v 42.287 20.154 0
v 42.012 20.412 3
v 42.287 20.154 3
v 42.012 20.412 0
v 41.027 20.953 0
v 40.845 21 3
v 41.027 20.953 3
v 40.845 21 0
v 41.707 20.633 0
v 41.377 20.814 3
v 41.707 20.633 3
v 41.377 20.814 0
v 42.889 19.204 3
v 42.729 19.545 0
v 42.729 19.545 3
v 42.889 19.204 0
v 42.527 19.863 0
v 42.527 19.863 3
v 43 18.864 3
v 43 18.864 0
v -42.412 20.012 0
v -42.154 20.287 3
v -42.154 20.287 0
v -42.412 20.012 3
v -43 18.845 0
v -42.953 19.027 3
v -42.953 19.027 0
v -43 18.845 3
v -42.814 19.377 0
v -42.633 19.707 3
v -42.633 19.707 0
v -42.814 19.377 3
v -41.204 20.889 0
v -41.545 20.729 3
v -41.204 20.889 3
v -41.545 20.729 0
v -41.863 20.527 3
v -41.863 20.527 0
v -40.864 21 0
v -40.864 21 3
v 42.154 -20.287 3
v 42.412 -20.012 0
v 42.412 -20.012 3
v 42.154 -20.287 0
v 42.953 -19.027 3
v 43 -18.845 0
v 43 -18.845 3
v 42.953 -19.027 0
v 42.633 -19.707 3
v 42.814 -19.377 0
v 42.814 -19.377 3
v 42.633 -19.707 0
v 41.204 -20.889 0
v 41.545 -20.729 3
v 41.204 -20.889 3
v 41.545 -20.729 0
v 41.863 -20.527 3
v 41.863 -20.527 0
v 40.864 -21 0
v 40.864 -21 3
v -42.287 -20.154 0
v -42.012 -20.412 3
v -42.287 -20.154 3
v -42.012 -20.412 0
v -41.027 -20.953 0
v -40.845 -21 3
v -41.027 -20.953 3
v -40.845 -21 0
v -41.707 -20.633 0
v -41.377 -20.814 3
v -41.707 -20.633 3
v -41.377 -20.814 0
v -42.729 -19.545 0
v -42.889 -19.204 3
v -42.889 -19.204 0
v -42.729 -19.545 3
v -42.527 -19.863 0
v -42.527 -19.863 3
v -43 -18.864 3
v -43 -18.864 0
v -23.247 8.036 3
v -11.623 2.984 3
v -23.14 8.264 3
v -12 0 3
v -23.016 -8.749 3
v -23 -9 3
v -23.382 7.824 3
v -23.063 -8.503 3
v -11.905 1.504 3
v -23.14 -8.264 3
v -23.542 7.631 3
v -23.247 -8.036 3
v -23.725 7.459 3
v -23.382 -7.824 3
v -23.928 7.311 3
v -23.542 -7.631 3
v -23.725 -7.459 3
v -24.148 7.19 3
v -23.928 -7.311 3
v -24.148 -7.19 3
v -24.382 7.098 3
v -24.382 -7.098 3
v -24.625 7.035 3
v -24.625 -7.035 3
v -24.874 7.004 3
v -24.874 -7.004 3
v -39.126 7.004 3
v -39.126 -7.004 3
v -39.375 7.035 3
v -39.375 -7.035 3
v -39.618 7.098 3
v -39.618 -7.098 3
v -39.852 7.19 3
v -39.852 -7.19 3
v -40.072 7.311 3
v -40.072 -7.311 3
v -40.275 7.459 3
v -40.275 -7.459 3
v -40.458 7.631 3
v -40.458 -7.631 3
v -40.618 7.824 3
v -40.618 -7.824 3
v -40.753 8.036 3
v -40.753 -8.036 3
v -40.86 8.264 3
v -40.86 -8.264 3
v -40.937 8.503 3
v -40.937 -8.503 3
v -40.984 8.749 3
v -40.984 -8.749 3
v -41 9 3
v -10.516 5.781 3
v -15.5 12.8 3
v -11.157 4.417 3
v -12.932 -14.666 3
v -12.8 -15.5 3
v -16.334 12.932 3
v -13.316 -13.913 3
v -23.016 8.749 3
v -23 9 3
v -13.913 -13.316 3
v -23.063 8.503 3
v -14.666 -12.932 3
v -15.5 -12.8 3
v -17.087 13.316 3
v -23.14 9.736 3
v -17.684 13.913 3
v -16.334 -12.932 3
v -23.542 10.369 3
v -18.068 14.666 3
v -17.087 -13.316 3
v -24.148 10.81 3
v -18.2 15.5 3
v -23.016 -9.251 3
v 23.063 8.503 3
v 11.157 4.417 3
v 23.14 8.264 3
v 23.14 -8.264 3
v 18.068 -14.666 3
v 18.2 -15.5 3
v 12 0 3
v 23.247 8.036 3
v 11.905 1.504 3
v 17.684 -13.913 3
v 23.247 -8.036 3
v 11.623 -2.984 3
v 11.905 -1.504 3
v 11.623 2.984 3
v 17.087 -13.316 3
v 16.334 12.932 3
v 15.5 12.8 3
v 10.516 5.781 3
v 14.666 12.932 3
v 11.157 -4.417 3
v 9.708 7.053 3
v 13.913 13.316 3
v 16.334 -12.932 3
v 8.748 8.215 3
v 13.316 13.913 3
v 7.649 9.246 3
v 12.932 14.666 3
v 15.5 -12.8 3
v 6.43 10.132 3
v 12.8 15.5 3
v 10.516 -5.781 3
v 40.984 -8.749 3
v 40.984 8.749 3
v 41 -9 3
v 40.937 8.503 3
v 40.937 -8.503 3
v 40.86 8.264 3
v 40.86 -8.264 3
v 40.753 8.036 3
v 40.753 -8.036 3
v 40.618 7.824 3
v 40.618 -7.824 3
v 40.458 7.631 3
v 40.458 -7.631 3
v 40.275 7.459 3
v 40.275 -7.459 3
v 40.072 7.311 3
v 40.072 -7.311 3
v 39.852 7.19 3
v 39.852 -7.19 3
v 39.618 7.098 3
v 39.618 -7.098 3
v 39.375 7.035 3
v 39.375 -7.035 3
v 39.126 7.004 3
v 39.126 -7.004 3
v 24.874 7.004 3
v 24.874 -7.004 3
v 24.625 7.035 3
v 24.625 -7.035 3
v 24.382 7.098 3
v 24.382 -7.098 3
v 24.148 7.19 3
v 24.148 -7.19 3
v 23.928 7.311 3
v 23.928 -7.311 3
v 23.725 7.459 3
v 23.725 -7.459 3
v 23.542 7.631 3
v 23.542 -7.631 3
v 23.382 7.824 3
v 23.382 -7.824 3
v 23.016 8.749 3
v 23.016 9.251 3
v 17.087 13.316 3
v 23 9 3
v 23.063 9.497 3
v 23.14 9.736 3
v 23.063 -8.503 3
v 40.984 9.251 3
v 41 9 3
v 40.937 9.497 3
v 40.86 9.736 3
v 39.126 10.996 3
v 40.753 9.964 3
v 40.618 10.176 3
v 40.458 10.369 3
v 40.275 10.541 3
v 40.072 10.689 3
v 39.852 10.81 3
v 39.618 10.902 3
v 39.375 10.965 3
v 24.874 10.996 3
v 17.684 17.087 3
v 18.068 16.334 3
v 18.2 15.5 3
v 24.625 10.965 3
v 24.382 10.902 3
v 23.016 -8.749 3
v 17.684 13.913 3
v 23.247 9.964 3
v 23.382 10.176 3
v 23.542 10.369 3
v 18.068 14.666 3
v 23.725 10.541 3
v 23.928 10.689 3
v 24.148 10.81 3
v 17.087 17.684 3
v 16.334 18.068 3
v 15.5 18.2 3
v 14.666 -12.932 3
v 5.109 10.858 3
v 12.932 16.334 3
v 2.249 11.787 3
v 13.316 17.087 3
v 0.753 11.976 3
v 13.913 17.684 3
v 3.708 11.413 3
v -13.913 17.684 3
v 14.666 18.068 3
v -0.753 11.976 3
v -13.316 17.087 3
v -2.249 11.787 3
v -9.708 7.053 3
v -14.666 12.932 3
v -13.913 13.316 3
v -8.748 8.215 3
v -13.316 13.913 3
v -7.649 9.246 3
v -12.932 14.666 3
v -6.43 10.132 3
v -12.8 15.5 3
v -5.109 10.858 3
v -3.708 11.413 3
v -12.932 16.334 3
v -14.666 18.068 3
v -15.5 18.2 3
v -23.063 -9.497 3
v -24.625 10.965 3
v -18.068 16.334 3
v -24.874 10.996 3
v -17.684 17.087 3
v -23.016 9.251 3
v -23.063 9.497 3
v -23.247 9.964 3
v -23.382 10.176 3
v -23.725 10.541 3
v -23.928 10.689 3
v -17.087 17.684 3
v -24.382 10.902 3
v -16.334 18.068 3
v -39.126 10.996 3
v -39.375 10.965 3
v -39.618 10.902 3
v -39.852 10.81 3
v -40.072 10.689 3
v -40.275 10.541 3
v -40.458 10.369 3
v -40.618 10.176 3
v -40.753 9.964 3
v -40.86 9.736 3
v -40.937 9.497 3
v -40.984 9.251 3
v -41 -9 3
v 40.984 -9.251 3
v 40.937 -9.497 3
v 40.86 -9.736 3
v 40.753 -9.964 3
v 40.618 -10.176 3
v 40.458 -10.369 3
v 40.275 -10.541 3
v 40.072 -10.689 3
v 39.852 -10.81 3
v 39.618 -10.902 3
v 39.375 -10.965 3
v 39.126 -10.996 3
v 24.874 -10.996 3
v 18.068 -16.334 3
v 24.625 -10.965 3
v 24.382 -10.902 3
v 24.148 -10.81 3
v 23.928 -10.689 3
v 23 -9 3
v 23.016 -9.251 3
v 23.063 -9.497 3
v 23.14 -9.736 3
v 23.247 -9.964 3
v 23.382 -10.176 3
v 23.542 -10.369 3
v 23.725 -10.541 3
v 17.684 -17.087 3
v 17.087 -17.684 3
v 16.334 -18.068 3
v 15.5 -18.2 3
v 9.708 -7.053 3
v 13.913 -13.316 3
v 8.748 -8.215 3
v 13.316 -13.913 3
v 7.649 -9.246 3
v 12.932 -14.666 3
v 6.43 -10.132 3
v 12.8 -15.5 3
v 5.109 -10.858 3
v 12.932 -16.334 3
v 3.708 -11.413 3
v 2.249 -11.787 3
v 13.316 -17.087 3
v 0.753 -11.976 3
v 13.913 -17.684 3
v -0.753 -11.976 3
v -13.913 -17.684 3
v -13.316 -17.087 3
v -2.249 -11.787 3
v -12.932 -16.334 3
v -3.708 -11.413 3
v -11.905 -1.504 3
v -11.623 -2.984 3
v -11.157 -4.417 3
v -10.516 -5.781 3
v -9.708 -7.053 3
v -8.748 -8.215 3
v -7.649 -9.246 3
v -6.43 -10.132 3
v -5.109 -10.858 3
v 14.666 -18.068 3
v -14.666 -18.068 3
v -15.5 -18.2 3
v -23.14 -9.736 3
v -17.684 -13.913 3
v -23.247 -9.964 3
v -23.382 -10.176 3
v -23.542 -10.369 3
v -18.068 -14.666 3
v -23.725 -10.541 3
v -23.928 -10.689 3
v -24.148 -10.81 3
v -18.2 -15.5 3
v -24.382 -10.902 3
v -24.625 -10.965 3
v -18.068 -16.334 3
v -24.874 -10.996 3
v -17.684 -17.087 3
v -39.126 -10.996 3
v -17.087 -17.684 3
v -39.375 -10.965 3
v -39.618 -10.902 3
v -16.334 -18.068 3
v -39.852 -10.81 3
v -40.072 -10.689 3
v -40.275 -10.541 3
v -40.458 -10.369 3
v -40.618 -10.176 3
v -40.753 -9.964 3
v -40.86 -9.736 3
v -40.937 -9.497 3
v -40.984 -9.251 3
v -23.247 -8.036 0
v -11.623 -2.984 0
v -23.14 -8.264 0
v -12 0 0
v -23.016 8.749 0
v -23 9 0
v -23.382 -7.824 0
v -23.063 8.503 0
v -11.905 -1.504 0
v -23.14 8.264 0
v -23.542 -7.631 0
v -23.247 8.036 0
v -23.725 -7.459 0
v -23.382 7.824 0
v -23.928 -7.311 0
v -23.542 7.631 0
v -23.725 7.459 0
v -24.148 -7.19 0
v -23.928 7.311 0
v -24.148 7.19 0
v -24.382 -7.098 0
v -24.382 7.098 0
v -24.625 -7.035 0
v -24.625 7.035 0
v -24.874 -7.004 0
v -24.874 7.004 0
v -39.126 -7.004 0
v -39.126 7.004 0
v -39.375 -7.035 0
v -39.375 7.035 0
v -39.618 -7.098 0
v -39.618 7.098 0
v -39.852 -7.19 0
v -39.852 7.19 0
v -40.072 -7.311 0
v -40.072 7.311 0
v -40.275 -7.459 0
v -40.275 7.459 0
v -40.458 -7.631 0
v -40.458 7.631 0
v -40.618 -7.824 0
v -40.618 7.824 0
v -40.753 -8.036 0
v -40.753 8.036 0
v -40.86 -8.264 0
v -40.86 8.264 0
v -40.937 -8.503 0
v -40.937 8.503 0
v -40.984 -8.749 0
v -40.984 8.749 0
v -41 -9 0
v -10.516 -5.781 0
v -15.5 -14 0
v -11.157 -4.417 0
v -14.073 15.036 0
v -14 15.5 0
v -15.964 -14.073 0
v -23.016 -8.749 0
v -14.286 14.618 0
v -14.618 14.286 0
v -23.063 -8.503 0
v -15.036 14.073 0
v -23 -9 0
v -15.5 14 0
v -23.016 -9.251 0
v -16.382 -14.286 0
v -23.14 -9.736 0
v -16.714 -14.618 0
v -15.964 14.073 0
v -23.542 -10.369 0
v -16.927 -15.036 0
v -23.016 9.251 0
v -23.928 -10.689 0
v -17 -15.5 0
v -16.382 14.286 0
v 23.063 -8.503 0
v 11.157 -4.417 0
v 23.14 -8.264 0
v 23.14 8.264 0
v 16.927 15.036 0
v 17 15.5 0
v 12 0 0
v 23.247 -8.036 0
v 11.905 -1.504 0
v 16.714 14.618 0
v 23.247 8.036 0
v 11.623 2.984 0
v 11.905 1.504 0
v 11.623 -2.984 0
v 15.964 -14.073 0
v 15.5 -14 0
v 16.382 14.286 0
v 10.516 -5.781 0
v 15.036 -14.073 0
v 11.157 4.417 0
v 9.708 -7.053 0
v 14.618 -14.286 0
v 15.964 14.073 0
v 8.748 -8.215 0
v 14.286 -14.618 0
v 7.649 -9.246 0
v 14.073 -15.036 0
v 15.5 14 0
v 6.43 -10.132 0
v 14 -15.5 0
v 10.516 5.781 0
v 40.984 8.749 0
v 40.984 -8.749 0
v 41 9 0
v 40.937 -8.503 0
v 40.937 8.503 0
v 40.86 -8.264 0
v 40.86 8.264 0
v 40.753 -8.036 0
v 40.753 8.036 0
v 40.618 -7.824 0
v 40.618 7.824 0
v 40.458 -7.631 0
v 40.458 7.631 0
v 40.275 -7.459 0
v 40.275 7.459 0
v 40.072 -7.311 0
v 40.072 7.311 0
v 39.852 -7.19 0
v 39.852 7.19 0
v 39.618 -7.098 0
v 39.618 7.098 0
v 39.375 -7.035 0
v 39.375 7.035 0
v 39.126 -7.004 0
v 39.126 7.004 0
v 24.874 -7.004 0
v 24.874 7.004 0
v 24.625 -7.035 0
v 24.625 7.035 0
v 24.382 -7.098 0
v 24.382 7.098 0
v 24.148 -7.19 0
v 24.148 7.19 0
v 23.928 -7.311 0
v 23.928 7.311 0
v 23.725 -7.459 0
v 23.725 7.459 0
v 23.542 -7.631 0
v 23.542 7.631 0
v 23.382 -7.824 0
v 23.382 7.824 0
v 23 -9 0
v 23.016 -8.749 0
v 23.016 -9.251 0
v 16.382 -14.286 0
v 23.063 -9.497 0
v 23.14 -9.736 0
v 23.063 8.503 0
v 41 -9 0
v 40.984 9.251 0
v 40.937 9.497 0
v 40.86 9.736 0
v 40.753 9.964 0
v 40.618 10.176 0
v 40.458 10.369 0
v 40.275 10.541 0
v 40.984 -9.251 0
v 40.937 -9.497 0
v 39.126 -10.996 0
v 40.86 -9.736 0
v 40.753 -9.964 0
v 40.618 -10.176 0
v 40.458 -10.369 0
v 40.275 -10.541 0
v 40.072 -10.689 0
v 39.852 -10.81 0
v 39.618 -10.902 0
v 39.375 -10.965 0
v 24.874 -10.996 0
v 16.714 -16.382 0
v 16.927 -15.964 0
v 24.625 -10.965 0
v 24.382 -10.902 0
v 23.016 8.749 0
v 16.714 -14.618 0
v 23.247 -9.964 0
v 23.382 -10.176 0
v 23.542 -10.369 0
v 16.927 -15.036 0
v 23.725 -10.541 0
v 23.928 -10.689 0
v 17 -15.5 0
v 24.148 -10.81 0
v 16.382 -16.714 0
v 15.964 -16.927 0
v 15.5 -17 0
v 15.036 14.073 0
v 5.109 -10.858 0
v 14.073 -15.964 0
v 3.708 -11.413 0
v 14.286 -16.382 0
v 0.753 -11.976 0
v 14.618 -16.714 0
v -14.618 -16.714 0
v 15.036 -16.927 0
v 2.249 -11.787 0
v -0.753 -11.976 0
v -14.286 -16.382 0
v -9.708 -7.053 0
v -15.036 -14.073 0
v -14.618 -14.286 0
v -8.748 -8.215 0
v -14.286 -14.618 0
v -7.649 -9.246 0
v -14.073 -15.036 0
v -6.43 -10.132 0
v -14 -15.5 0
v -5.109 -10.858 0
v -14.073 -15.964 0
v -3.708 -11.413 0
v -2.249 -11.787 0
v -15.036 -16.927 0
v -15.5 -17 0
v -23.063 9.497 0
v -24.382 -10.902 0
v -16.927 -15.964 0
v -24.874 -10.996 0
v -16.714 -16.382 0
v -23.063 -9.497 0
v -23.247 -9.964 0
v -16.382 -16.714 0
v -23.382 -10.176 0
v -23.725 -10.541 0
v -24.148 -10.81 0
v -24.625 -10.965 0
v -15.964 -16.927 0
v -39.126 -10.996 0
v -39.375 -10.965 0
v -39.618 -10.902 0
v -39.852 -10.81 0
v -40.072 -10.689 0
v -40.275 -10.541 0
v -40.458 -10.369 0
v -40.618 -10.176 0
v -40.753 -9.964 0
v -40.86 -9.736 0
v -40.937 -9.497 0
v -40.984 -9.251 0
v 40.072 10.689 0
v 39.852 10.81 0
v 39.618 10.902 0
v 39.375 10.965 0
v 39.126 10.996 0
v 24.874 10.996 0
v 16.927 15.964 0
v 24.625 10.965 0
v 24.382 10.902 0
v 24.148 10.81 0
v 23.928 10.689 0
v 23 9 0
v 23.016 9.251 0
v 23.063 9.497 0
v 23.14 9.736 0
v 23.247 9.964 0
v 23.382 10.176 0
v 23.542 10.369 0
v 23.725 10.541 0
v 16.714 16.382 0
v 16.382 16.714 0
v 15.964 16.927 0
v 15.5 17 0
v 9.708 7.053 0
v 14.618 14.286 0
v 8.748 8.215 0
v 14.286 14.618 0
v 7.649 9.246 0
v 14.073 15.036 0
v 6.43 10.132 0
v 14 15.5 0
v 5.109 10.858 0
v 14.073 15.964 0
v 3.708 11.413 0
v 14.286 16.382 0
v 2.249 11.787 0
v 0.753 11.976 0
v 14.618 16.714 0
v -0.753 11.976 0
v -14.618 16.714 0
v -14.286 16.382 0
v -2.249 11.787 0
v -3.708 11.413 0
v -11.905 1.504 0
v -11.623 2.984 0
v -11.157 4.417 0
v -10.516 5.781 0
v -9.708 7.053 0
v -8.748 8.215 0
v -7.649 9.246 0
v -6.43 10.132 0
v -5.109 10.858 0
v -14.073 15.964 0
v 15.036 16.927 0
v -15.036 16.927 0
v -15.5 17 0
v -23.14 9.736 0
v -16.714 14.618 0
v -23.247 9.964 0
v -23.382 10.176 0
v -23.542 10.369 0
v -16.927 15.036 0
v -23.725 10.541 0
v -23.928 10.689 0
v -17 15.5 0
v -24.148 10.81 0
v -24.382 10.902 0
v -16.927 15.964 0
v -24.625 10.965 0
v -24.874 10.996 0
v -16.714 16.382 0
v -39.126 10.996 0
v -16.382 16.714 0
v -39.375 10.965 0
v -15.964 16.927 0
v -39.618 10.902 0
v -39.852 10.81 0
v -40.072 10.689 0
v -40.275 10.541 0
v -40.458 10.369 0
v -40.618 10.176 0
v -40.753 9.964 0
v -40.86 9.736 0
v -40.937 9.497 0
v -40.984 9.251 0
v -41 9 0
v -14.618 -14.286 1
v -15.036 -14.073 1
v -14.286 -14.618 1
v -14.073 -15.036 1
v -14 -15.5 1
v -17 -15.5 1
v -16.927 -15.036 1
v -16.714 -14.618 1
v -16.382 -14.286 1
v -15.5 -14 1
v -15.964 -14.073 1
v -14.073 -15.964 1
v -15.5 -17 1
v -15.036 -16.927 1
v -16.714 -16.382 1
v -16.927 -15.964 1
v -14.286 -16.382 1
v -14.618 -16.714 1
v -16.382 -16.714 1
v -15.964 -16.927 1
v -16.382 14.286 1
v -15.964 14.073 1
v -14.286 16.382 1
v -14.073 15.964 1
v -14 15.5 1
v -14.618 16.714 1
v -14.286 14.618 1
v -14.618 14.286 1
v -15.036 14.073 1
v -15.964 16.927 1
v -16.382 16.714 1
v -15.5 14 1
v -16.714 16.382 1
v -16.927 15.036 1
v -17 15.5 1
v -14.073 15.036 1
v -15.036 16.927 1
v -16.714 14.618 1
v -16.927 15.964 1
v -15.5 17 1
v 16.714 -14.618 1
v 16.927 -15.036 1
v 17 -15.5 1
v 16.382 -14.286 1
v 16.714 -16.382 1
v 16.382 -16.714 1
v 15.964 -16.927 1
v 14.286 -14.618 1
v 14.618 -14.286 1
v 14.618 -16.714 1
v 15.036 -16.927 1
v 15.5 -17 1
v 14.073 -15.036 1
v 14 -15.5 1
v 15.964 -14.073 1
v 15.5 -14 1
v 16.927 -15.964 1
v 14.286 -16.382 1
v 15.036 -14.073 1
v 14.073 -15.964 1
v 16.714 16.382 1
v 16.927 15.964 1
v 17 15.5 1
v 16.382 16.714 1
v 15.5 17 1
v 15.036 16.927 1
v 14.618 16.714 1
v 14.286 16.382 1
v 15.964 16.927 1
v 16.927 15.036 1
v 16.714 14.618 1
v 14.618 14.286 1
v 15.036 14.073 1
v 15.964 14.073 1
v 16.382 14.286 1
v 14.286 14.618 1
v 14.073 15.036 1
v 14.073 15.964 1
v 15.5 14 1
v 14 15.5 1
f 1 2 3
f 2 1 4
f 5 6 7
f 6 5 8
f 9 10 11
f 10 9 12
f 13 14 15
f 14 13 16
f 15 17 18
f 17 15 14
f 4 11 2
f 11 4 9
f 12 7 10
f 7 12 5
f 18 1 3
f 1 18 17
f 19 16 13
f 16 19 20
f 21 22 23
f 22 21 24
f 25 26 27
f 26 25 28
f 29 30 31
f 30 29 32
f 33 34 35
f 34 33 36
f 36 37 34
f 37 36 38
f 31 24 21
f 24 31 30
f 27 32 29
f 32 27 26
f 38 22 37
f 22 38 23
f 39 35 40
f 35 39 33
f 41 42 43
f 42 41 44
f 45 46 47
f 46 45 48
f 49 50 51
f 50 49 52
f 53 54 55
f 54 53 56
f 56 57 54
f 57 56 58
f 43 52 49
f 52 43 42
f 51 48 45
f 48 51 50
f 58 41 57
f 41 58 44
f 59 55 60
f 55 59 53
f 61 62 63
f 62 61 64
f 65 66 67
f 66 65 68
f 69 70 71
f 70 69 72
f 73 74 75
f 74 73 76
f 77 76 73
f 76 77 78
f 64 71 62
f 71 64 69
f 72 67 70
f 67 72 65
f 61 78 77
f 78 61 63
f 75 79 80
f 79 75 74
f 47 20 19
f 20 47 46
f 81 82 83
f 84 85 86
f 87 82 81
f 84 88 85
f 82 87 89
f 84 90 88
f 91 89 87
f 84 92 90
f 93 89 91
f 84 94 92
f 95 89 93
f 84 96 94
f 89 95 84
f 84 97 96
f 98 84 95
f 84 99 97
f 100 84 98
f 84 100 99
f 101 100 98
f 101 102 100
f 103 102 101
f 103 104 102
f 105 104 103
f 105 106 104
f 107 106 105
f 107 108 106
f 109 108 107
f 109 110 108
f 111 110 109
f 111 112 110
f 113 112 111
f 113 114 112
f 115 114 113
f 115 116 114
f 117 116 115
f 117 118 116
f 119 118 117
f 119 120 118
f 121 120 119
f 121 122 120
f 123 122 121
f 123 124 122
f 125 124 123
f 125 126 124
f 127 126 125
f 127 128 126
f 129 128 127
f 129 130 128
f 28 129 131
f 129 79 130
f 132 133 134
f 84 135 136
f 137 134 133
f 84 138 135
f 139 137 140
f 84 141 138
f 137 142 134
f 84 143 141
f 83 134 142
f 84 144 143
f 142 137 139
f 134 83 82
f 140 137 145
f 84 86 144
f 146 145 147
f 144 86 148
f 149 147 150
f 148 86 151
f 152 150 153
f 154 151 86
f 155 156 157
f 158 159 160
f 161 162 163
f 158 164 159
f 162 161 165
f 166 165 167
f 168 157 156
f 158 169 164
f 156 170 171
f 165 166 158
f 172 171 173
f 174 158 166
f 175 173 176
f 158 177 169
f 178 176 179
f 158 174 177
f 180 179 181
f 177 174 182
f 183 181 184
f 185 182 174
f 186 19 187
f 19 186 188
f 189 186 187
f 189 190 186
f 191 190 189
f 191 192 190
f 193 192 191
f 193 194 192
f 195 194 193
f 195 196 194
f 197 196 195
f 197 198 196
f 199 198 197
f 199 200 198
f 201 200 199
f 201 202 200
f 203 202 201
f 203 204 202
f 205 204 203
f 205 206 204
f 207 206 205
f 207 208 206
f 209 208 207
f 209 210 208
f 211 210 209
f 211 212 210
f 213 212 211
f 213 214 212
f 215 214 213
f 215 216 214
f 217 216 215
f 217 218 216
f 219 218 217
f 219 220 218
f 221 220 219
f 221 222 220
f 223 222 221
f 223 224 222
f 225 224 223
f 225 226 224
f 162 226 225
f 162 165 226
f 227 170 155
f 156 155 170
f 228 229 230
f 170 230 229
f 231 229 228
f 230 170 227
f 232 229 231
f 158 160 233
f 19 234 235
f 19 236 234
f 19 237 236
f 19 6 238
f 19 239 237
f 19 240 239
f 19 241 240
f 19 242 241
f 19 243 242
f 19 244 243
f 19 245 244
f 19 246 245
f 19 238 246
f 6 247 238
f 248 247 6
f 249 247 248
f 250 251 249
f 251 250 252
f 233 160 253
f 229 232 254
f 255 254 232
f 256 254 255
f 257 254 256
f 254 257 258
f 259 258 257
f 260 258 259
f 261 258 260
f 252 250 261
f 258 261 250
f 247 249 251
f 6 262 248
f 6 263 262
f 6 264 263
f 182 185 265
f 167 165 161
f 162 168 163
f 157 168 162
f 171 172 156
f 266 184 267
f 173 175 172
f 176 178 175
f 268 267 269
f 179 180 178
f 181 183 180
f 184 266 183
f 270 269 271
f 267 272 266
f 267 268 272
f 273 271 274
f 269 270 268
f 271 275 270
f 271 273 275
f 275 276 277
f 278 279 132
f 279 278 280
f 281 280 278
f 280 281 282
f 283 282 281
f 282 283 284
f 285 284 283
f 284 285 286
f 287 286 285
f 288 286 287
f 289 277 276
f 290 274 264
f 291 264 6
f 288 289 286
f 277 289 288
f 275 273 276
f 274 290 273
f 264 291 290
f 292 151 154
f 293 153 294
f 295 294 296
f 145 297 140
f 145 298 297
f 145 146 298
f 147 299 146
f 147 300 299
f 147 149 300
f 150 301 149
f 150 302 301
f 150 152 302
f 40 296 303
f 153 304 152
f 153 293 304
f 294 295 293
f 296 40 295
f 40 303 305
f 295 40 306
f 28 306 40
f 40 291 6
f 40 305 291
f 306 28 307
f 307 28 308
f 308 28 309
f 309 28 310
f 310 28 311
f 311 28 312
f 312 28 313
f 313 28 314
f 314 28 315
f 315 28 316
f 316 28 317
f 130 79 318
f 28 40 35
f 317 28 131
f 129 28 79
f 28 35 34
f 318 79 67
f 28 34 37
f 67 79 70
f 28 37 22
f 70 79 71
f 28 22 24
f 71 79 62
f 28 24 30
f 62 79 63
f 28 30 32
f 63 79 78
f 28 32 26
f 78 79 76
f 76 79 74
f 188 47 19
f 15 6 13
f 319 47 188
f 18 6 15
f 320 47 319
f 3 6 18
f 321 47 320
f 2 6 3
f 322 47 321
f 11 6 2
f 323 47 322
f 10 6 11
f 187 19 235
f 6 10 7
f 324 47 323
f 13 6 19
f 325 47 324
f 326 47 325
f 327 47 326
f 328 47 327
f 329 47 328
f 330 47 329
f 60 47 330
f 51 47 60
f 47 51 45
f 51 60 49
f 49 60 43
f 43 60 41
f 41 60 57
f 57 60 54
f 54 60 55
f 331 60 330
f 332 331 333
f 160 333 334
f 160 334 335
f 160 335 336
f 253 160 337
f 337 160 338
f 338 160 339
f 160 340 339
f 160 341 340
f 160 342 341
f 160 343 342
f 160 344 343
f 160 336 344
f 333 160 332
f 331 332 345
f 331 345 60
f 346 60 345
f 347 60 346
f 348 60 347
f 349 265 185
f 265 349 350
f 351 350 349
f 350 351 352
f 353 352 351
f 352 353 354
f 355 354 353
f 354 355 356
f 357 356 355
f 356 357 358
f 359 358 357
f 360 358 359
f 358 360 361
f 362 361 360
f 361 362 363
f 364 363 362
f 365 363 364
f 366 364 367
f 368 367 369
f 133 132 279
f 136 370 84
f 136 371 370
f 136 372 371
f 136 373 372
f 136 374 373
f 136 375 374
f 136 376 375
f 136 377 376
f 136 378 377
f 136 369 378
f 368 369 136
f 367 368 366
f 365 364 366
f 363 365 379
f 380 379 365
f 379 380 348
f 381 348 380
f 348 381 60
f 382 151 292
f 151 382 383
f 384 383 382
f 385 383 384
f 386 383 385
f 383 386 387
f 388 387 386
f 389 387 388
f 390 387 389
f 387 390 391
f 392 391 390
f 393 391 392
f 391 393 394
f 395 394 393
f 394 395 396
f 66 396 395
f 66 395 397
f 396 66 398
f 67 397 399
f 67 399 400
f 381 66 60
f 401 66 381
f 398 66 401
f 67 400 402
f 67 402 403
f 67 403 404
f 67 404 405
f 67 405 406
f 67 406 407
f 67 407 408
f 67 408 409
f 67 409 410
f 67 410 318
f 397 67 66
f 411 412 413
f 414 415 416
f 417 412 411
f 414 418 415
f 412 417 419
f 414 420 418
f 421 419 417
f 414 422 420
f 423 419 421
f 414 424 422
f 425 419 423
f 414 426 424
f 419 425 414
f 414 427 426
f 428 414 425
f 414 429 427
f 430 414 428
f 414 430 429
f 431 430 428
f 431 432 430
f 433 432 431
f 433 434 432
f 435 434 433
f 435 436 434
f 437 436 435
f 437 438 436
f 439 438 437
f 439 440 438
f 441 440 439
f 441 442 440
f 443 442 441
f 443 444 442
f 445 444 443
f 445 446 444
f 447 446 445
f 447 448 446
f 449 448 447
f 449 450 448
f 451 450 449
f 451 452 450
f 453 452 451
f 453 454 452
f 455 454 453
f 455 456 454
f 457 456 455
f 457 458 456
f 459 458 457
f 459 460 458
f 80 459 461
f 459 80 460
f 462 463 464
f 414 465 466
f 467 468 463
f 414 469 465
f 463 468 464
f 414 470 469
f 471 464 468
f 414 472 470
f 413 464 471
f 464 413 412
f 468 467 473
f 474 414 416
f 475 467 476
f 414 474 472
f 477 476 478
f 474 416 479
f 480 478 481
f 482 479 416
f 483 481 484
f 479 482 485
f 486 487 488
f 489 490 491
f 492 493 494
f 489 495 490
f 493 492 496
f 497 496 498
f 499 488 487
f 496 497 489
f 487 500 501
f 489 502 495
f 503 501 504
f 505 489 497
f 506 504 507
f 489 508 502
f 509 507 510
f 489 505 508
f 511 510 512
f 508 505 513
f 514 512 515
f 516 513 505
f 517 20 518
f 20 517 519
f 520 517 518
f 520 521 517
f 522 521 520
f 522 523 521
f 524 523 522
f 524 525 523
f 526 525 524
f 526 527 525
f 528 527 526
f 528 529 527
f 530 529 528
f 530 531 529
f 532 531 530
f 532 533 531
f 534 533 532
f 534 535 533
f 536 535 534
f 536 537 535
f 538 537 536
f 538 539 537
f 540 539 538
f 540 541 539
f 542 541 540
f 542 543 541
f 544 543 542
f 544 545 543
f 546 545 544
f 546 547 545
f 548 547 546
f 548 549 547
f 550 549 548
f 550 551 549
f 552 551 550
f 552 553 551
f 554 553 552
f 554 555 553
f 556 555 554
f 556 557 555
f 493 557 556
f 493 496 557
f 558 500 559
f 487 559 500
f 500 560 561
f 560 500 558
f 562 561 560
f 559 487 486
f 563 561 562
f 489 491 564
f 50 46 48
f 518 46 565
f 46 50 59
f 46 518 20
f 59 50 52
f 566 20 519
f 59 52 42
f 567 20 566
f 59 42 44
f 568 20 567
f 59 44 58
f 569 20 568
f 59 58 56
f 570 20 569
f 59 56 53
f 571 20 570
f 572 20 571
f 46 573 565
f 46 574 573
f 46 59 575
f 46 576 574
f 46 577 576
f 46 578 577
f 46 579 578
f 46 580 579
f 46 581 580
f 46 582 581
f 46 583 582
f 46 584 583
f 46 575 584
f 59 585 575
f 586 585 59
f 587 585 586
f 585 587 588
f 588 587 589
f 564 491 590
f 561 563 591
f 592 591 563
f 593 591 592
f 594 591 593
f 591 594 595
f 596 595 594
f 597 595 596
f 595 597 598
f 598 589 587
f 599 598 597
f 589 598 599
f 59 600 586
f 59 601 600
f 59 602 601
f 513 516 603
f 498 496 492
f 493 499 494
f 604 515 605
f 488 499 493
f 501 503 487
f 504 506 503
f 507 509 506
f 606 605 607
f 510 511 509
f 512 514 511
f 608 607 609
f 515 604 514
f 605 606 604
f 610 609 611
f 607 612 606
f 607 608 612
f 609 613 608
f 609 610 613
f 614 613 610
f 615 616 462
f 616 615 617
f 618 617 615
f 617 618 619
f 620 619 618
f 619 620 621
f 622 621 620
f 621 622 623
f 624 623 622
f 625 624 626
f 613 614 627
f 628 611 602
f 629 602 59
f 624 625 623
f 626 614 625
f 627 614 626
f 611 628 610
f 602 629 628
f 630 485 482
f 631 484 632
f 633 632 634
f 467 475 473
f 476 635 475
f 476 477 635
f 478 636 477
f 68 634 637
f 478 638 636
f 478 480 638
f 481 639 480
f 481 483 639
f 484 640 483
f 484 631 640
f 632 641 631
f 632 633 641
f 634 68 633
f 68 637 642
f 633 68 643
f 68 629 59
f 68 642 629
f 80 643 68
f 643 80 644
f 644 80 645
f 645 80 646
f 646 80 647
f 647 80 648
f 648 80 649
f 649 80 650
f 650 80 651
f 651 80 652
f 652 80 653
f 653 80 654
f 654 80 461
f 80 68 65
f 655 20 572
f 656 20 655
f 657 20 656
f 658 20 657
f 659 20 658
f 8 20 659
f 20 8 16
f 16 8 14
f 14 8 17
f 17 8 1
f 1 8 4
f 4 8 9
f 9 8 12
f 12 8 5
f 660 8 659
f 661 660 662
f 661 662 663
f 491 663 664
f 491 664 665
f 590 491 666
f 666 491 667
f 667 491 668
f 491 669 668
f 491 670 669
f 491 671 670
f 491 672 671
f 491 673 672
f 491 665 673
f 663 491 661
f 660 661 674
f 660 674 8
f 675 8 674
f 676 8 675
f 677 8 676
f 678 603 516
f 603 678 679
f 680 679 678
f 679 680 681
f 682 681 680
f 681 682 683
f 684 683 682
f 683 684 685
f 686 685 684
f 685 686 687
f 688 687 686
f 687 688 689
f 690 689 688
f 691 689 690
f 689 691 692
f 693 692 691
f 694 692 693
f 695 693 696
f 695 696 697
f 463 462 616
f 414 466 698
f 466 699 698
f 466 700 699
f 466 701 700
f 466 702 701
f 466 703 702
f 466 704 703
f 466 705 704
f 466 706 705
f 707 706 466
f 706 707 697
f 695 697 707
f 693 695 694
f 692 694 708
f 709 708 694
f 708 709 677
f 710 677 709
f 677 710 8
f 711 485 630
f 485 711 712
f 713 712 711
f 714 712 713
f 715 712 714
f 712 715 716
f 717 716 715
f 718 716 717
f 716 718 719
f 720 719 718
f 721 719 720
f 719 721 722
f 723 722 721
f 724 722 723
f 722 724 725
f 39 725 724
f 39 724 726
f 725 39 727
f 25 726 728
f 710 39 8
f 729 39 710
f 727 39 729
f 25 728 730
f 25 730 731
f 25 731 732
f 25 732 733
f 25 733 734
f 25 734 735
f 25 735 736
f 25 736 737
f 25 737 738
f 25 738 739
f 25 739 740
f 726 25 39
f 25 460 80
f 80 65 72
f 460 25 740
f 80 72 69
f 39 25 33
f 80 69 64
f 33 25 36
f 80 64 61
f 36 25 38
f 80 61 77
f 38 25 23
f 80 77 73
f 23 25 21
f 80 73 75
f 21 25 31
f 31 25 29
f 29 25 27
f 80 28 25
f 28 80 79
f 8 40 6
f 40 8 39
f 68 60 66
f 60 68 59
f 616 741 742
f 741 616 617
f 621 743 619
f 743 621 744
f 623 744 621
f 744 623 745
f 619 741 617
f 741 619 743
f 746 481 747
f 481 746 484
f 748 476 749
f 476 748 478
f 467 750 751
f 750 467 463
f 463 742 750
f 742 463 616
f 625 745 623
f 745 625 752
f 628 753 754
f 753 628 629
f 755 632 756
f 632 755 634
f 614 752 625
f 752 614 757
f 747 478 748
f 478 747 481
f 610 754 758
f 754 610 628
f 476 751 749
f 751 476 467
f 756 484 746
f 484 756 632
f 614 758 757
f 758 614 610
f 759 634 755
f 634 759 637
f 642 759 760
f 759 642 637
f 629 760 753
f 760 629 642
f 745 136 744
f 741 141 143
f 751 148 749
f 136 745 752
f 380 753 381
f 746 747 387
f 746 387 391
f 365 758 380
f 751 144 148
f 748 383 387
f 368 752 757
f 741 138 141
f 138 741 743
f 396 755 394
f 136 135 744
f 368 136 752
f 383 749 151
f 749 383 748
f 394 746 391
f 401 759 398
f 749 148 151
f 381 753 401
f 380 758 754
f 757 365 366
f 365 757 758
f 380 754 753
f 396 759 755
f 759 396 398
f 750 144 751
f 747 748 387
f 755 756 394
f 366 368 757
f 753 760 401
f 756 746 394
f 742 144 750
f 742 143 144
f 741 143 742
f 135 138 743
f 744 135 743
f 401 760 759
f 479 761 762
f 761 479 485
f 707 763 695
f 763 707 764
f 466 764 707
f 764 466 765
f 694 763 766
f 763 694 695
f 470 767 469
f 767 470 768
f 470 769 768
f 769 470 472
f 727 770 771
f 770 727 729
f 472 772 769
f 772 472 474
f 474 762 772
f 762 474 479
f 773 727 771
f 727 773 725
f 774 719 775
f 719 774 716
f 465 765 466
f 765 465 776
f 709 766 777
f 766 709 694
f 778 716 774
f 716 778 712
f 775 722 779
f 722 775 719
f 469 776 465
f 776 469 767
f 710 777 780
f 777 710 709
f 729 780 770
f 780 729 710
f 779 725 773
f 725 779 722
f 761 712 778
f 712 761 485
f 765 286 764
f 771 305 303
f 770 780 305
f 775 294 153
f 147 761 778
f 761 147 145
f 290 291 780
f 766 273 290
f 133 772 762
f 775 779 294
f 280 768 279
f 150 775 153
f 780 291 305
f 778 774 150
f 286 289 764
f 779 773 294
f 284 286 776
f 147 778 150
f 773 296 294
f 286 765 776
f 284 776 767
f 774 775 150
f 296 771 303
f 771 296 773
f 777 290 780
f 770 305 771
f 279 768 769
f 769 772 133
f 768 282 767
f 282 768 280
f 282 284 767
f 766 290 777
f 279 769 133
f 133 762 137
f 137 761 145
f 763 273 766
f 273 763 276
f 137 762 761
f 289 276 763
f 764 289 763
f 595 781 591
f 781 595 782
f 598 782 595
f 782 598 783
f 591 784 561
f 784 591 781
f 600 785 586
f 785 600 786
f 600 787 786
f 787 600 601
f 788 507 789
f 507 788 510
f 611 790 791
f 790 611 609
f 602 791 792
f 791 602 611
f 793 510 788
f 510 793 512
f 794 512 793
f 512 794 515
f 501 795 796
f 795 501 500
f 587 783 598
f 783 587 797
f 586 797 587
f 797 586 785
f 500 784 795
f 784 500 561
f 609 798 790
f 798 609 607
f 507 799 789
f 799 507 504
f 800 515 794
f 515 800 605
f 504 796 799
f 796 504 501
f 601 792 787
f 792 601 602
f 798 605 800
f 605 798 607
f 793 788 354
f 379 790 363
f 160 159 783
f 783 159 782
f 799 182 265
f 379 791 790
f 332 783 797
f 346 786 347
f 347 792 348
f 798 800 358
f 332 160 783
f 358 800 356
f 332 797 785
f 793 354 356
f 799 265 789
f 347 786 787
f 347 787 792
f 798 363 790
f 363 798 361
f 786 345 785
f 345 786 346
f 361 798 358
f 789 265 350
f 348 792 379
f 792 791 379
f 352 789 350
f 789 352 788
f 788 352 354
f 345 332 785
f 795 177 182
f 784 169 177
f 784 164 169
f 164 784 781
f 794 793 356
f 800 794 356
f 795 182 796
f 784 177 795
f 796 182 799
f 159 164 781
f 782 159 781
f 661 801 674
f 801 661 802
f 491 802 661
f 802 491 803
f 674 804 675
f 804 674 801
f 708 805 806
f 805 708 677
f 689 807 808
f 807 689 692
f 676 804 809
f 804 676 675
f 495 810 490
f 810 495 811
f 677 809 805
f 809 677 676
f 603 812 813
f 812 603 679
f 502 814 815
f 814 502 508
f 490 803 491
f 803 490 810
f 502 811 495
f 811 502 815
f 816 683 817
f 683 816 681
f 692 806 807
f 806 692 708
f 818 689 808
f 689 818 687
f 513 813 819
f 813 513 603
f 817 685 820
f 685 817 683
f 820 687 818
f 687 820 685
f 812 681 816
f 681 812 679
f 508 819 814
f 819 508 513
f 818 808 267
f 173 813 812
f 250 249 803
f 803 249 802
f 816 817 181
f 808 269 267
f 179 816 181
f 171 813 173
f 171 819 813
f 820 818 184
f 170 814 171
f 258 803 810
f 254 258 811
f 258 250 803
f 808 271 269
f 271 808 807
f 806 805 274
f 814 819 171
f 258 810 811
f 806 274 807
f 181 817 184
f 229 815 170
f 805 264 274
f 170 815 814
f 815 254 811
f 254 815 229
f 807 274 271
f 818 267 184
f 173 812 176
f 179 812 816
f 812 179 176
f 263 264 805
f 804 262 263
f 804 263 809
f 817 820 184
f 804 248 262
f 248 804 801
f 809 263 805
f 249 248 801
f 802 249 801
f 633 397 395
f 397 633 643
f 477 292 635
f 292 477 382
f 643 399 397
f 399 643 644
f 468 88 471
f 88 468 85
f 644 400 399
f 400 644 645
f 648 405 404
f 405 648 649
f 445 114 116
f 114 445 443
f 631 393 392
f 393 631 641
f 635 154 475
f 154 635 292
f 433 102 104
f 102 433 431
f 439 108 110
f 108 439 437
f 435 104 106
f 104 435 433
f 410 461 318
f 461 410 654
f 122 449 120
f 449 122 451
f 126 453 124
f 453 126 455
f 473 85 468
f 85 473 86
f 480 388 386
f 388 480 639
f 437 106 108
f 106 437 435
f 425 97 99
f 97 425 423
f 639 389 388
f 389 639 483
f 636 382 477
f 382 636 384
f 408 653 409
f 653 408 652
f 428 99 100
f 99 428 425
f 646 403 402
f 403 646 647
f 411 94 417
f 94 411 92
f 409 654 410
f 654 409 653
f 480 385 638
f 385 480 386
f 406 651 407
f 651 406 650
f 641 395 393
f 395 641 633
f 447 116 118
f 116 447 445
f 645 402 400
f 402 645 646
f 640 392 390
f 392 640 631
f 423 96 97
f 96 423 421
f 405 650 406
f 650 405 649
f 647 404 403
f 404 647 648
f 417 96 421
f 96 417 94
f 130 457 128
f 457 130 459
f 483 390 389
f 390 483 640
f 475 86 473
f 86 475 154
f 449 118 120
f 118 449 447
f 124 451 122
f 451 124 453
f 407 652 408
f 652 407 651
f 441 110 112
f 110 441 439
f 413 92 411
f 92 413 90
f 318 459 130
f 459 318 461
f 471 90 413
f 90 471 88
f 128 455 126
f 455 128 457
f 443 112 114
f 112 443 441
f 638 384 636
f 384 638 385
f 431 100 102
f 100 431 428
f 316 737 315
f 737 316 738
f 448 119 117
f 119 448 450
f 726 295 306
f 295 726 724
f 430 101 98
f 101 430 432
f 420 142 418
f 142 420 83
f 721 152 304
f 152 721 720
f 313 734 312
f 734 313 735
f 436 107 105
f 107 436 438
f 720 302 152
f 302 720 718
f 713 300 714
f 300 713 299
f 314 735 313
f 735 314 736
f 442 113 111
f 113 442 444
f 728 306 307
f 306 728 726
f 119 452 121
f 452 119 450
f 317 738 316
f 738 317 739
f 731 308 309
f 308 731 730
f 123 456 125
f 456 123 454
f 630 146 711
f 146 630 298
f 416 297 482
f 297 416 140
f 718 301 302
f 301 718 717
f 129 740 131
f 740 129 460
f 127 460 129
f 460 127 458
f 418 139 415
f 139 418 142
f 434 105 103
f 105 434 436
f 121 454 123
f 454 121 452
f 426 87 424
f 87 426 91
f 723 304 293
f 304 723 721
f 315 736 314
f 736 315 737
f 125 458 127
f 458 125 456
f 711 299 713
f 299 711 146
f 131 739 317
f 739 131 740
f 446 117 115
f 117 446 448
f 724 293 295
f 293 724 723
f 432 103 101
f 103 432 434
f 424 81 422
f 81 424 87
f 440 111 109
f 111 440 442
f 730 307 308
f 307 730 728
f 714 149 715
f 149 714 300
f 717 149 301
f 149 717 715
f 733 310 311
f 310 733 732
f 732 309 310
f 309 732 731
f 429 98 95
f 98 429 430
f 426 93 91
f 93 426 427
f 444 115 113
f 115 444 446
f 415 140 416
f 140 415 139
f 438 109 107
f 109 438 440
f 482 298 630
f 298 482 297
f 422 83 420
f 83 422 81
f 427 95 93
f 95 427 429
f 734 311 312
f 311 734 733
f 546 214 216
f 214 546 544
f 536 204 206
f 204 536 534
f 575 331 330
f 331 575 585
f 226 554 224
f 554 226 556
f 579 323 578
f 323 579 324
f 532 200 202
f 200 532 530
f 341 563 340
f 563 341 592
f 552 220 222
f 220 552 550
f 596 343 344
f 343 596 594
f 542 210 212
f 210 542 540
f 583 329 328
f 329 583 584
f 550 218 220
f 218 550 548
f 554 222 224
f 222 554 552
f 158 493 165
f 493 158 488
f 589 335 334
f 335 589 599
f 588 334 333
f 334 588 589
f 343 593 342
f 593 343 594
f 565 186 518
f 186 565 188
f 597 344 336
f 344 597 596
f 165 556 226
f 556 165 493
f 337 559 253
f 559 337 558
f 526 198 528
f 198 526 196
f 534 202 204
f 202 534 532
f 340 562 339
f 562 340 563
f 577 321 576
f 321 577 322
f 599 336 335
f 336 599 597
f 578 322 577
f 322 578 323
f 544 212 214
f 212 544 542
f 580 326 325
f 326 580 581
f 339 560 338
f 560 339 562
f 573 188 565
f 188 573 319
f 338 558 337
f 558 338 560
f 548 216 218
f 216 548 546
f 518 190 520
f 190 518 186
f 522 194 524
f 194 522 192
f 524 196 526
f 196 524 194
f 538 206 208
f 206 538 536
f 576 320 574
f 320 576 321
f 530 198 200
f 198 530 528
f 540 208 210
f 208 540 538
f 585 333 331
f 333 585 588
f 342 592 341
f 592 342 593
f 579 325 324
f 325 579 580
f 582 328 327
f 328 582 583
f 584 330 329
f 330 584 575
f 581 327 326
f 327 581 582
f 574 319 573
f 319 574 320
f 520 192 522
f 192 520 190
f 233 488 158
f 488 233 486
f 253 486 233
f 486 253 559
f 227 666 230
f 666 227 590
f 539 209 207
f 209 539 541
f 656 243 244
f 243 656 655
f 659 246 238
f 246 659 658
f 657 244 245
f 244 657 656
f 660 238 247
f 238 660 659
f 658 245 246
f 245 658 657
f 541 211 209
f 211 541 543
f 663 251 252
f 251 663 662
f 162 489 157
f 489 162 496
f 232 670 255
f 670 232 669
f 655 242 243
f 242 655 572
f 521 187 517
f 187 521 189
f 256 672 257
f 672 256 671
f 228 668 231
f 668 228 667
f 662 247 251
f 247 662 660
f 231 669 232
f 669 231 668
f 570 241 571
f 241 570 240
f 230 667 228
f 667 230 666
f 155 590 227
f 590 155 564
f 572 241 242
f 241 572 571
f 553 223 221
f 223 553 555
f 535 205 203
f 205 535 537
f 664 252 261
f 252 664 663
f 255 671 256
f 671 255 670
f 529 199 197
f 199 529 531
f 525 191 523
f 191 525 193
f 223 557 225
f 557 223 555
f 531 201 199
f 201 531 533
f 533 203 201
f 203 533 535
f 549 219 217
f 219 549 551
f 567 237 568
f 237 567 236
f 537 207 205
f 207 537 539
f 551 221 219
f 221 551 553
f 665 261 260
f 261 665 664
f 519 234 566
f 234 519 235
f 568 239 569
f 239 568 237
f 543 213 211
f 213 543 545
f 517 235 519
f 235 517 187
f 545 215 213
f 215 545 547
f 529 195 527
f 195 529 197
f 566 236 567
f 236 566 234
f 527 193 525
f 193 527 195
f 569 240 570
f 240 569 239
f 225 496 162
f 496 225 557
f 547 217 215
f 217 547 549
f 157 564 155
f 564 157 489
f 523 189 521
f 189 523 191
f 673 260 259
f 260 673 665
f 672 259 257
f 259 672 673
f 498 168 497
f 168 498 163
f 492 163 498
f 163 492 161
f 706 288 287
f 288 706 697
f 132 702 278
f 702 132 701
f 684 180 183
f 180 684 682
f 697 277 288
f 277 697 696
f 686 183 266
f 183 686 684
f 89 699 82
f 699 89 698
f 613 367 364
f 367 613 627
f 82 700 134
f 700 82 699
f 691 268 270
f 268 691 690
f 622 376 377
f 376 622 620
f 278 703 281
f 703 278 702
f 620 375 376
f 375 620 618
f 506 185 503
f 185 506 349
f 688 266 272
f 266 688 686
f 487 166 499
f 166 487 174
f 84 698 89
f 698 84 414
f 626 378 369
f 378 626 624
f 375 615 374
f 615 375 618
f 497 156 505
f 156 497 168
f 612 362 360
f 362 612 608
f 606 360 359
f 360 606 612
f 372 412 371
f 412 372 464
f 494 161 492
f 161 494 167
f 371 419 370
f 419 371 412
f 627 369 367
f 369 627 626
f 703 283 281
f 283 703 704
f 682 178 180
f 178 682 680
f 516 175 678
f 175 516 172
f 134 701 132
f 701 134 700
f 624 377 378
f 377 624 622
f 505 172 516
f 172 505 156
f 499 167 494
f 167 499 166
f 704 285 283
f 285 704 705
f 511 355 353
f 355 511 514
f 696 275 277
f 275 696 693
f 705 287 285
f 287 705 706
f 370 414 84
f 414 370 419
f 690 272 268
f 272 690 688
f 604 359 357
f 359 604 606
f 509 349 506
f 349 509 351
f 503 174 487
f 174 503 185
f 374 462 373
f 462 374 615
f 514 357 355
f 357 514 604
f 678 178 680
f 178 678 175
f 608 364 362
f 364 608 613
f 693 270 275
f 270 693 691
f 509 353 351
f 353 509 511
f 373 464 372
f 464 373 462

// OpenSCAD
// file: utils.scad
// Author: Mihai Oltean, www.tcreate.org, mihai.oltean@gmail.com
// More details: jenny5.org
// Source: github.com/jenny5-robot
// MIT License
//--------------------------------------------------------------

module colt(radius, height)
{
	difference(){
		cube ([radius, radius, height]);
		cylinder	(h = height, r = radius, $fn = 30);
	}
}
/////////////////////////////////////////////////////////////////////////////////////////////////////////////////////////
module colt_sferic(radius)
{
	difference(){
		cube ([radius, radius, radius]);
		sphere(r = radius, $fn = 40);
	}
}
/////////////////////////////////////////////////////////////////////////////////////////////////////////////////////////
module coloana_sferica(height, radius)
{
		difference(){
			cube ([height, height, height]);
			cylinder(h= height, r = radius, $fn = 50);
		}
}
/////////////////////////////////////////////////////////////////////////////////////////////////////////////////////////
// file: config.scad
// Author: Mihai Oltean, www.tcreate.org, mihai.oltean@gmail.com
// More details: jenny5.org
// Source: github.com/jenny5-robot
// MIT License
//--------------------------------------------------------------

aluminium_color = "Silver";
screw_color = "LightSlateGray";
frame_color = aluminium_color;
shaft_color = "Silver";
plastic_color = "LimeGreen";
pulley_color = "DarkSlateGray";
// file: params_basic_components.scad
// Author: Mihai Oltean, www.tcreate.org, mihai.oltean@gmail.com
// More details: jenny5.org
// Source: github.com/jenny5-robot
// MIT License
//--------------------------------------------------------------

spring_length = 20;

smooth_rod_8_radius = 4;
smooth_rod_10_radius = 5;
smooth_rod_12_radius = 6;

tolerance = 0.1;
display_tolerance = 1;

overlap_tolerance = 0.01;


wall_thick_1 = 1;
wall_thick_2 = 2;
wall_thick_3 = 3;
wall_thick_4 = 4;
wall_thick_5 = 5;
wall_thick_5_5 = 5.5;
wall_thick_6 = 6;
wall_thick_7 = 7;
wall_thick_8 = 8;
wall_thick_9 = 9;
wall_thick_10 = 10;
wall_thick_12 = 10;

wrench_radius = 11;

ghidaj_radius = 4;
ghidaj_radius_12 = 6;

canal_diameter = 8.22;
canal_height = 2.2;

filament_radius = 0.9;

bowden_tube_radius = 2.5;

m3_tolerance = 0.1;

latura_mare_L = 40;
latura_mica_L = 15;
grosime_perete_L = 3;

latura_L_50x50 = 50;
latura_L_40x40 = 40;

latura_U_50x50 = 50;
latura_U_40x40 = 40;


tolerance_z = [0, 0, tolerance];
tolerance_x = [tolerance, 0, 0];
tolerance_y = [0, tolerance, 0];

display_tolerance_z = [0, 0, display_tolerance];
display_tolerance_x = [display_tolerance, 0, 0];
display_tolerance_y = [0, display_tolerance, 0];
// file: params_stepper_motors.scad
// Author: Mihai Oltean, www.tcreate.org, mihai.oltean@gmail.com
// More details: jenny5.org
// Source: github.com/jenny5-robot
// MIT License
//--------------------------------------------------------------

nema_17_width = 42.3;
nema_17_motor_height_sparkfun = 36;
nema_17_motor_hole_radius_sparkfun  = 14;
nema_17_motor_hole_radius_camiel  = 12;
nema_17_dist_between_screw_holes = 31;
nema_17_height = 47;
nema_17_shaft_length = 24;

nema_14_width = 39.3;
nema_14_motor_hole_radius  = 11;
nema_14_dist_between_screw_holes = 31;
nema_14_height = 47;
nema_14_shaft_length = 20;

nema_11_width = 28;
nema_11_motor_hole_radius = 11;
nema_11_motor_gearbox_radius = 14;
nema_11_motor_gearbox_hole_radius = 9;
nema_11_gearbox_dist_between_screw_holes = 22 / sqrt(2);
nema_11_dist_between_screw_holes = 23;
nema_11_height = 32;
nema_11_with_gearbox_height = 53;
nema_11_gearbox_length = 25;
nema_11_shaft_length = 18;

nema_17_motor_gearbox_radius = 18;
nema_17_gearbox_dist_between_screw_holes = 20;
nema_17_with_gearbox_height = 82.8;
nema_17_gearbox_length = 30;
nema_17_gearbox_base_height = 5;
nema_17_gearbox_shaft_length = 18;
nema_17_gearbox_shaft_radius = 4;
nema_17_gearbox_motor_hole_radius  = 11;



nema_11_sizes = [nema_11_width, nema_11_width, nema_11_height];

gauri_nema_17 = [
[0, 0, 0], 
[-nema_17_dist_between_screw_holes / 2, -nema_17_dist_between_screw_holes / 2, 0], 
[-nema_17_dist_between_screw_holes / 2, nema_17_dist_between_screw_holes / 2, 0], 
[nema_17_dist_between_screw_holes / 2, -nema_17_dist_between_screw_holes / 2, 0], 
[nema_17_dist_between_screw_holes / 2, nema_17_dist_between_screw_holes / 2, 0]
];

gauri_nema_11 = [
[0, 0, 0], 
[-nema_11_dist_between_screw_holes / 2, -nema_11_dist_between_screw_holes / 2, 0], 
[-nema_11_dist_between_screw_holes / 2, nema_11_dist_between_screw_holes / 2, 0], 
[nema_11_dist_between_screw_holes / 2, -nema_11_dist_between_screw_holes / 2, 0], 
[nema_11_dist_between_screw_holes / 2, nema_11_dist_between_screw_holes / 2, 0]
];

gearbox_nema_11_holes_position = [[0, 0, 0], 
[-nema_11_gearbox_dist_between_screw_holes / 2, -nema_11_gearbox_dist_between_screw_holes / 2, 0], [-nema_11_gearbox_dist_between_screw_holes / 2, nema_11_gearbox_dist_between_screw_holes / 2, 0], [nema_11_gearbox_dist_between_screw_holes / 2, -nema_11_gearbox_dist_between_screw_holes / 2, 0], [nema_11_gearbox_dist_between_screw_holes / 2, nema_11_gearbox_dist_between_screw_holes / 2, 0]];

gearbox_nema_17_holes_position = [
[0, 0, 0], 
[-nema_17_gearbox_dist_between_screw_holes / 2, -nema_17_gearbox_dist_between_screw_holes / 2, 0], 
[-nema_17_gearbox_dist_between_screw_holes / 2, nema_17_gearbox_dist_between_screw_holes / 2, 0], 
[nema_17_gearbox_dist_between_screw_holes / 2, -nema_17_gearbox_dist_between_screw_holes / 2, 0], 
[nema_17_gearbox_dist_between_screw_holes / 2, nema_17_gearbox_dist_between_screw_holes / 2, 0]
];
// file: params_screws_nuts_washers.scad
m2_screw_radius = 1;
m2_nut_radius = 2.2;
m2_nut_height = 1.6;
m2_nut_thick = m2_nut_height;

m3_screw_radius = 1.5;
m3_nut_radius = 3.1;
m3_nut_height = 2.3;
m3_nut_thick = m3_nut_height;
m3_autolock_nut_thick = m3_nut_thick + 1;

m4_screw_radius = 2;
m4_nut_radius = 4;
m4_auto_lock_nut_height = 5;
m4_nut_height = 3.25;
m4_nut_thick = 3.25;

m5_screw_radius = 2.5;
m5_nut_radius = 4.6;
m5_nut_height = 4;

m6_screw_radius = 3;
m6_nut_radius = 5.65;
m6_nut_thick = 5;
m6_nut_slim_thick = 3;
m6_autolock_nut_thick = 6;
m6_long_nut_thick = 9;

m8_screw_head_height = 5.7;
m8_screw_radius = 3.9;
m8_nut_small_width = 12.8;
m8_nut_radius = 7.35;
m8_slim_nut_small_width = 12.4;
m8_nut_thick = 6.5;
m8_nut_height = m8_nut_thick;
m8_slim_nut_height = 5.5;
m8_screw_head_radius = 6.5;
m8_autolock_nut_thick = 8;

m10_screw_radius = 5;
m10_nut_thick = 8;
m10_nut_radius = 9.8;

m12_screw_radius = 6;
m12_nut_thick = 8;
m12_nut_radius = 11;

m10_long_nut_radius = 9.71;
m10_long_nut_height = 29.8;

m10_long_thick_nut_radius = 7.41;
m10_long_thick_nut_height = 30.4;

m12_plastic_nut_radius = 10.45;
m12_plastic_nut_height = 23.3;

tr12_3_nut_radius = 11;
tr12_3_nut_height = 18.1;

washer_5 = 0.97;

washer_4_12_radius = 6;
washer_4_12_external_radius = 6;
washer_4_12_thick = 1;
washer_4_thick = 1;
washer_4_12_internal_radius = 2.15;

washer_4_9_external_radius = 4.5;
washer_4_9_internal_radius = 2.15;
washer_4_9_thick = 1;

washer_6_thick = 1.5;
washer_8_thick = 1.5;
washer_5_thick = 1;

washer_10_height = 2;
// file: params_placa_motor.scad
// Author: Mihai Oltean, www.tcreate.org, mihai.oltean@gmail.com
// More details: jenny5.org
// Source: github.com/jenny5-robot
// MIT License
//--------------------------------------------------------------

placa_motor_trunchi_size = ([86, 42, 3]);

function f_placa_motor_holes(length, width)  = [
[0, 0, 0], 
[-(length / 2 - 11), - (width / 2 - 12), 0],
[-(length / 2 - 11), (width / 2 - 12), 0],
[(length / 2 - 11), - (width / 2 - 12), 0],
[(length / 2 - 11), (width / 2 - 12), 0]
];

pozitie_gauri_placa_motor = f_placa_motor_holes(placa_motor_trunchi_size[0], placa_motor_trunchi_size[1]);
// main file
// Author: Mihai Oltean, www.tcreate.org, mihai.oltean@gmail.com
// More details: jenny5.org
// Source: github.com/jenny5-robot
// MIT License
//--------------------------------------------------------------

include <params_placa_motor.scad>
include <params_screws_nuts_washers.scad>
include <params_stepper_motors.scad>
include <params_basic_components.scad>
use <stepper_motors_utils.scad>
include <config.scad>

//----------------------------------------------------------------------------
module gauri_placa_motor(length, width, adancime, radius1 = 1.5, radius2 = 1.5, tolerance_x, tolerance_y)
{
	radius = m4_screw_radius;
    //dist_between_screw_holes_x = length - 2 * (8 + 0);
    //dist_between_screw_holes_y = width - 2 * (6 + 0);
   
    placa_motor_holes = f_placa_motor_holes(length, width);
        
    translate (placa_motor_holes[0] - display_tolerance_z) cylinder (h = adancime  + 2 * display_tolerance, r = nema_17_motor_hole_radius_camiel, $fn = 50);

    for (i = [1:4])
        hull(){
            translate (placa_motor_holes[i] - [tolerance_x, tolerance_y, 0] - display_tolerance_z) cylinder (h = adancime  + 2 * display_tolerance, r = radius, $fn = 50);
            translate (placa_motor_holes[i] + [tolerance_x, tolerance_y, 0] - display_tolerance_z) cylinder (h = adancime  + 2 * display_tolerance, r = radius, $fn = 50);
        }
}
//---------------------------------------------------------------------------
module placa_motor_trunchi(motor_housing_tolerance)
{
    difference(){
        color (plastic_color)
        translate ([-placa_motor_trunchi_size[0] / 2, -placa_motor_trunchi_size[1] / 2, 0]) my_cube_rounded2(placa_motor_trunchi_size);
        //translate ([- nema_17_width / 2, - nema_17_width / 2, 0]) gauri_nema17_with_motor_hole(placa_motor_trunchi_size[2], 1.5, 2.7);
        for (i =[0:4]){
            translate (gauri_nema_17[i]) cylinder (h = placa_motor_trunchi_size[2], r = 1.5, $fn = 20);
            translate (gauri_nema_17[i] + [0, 0, placa_motor_trunchi_size[2] - 2]) cylinder (h = 2, r1 = 1.5, r2 = 2.7, $fn = 20);
        }
        
        gauri_placa_motor(placa_motor_trunchi_size[0], placa_motor_trunchi_size[1], placa_motor_trunchi_size[2], 2.1, 2.1, motor_housing_tolerance, 0);
    }
}
//---------------------------------------------------------------------------


placa_motor_trunchi(7);
